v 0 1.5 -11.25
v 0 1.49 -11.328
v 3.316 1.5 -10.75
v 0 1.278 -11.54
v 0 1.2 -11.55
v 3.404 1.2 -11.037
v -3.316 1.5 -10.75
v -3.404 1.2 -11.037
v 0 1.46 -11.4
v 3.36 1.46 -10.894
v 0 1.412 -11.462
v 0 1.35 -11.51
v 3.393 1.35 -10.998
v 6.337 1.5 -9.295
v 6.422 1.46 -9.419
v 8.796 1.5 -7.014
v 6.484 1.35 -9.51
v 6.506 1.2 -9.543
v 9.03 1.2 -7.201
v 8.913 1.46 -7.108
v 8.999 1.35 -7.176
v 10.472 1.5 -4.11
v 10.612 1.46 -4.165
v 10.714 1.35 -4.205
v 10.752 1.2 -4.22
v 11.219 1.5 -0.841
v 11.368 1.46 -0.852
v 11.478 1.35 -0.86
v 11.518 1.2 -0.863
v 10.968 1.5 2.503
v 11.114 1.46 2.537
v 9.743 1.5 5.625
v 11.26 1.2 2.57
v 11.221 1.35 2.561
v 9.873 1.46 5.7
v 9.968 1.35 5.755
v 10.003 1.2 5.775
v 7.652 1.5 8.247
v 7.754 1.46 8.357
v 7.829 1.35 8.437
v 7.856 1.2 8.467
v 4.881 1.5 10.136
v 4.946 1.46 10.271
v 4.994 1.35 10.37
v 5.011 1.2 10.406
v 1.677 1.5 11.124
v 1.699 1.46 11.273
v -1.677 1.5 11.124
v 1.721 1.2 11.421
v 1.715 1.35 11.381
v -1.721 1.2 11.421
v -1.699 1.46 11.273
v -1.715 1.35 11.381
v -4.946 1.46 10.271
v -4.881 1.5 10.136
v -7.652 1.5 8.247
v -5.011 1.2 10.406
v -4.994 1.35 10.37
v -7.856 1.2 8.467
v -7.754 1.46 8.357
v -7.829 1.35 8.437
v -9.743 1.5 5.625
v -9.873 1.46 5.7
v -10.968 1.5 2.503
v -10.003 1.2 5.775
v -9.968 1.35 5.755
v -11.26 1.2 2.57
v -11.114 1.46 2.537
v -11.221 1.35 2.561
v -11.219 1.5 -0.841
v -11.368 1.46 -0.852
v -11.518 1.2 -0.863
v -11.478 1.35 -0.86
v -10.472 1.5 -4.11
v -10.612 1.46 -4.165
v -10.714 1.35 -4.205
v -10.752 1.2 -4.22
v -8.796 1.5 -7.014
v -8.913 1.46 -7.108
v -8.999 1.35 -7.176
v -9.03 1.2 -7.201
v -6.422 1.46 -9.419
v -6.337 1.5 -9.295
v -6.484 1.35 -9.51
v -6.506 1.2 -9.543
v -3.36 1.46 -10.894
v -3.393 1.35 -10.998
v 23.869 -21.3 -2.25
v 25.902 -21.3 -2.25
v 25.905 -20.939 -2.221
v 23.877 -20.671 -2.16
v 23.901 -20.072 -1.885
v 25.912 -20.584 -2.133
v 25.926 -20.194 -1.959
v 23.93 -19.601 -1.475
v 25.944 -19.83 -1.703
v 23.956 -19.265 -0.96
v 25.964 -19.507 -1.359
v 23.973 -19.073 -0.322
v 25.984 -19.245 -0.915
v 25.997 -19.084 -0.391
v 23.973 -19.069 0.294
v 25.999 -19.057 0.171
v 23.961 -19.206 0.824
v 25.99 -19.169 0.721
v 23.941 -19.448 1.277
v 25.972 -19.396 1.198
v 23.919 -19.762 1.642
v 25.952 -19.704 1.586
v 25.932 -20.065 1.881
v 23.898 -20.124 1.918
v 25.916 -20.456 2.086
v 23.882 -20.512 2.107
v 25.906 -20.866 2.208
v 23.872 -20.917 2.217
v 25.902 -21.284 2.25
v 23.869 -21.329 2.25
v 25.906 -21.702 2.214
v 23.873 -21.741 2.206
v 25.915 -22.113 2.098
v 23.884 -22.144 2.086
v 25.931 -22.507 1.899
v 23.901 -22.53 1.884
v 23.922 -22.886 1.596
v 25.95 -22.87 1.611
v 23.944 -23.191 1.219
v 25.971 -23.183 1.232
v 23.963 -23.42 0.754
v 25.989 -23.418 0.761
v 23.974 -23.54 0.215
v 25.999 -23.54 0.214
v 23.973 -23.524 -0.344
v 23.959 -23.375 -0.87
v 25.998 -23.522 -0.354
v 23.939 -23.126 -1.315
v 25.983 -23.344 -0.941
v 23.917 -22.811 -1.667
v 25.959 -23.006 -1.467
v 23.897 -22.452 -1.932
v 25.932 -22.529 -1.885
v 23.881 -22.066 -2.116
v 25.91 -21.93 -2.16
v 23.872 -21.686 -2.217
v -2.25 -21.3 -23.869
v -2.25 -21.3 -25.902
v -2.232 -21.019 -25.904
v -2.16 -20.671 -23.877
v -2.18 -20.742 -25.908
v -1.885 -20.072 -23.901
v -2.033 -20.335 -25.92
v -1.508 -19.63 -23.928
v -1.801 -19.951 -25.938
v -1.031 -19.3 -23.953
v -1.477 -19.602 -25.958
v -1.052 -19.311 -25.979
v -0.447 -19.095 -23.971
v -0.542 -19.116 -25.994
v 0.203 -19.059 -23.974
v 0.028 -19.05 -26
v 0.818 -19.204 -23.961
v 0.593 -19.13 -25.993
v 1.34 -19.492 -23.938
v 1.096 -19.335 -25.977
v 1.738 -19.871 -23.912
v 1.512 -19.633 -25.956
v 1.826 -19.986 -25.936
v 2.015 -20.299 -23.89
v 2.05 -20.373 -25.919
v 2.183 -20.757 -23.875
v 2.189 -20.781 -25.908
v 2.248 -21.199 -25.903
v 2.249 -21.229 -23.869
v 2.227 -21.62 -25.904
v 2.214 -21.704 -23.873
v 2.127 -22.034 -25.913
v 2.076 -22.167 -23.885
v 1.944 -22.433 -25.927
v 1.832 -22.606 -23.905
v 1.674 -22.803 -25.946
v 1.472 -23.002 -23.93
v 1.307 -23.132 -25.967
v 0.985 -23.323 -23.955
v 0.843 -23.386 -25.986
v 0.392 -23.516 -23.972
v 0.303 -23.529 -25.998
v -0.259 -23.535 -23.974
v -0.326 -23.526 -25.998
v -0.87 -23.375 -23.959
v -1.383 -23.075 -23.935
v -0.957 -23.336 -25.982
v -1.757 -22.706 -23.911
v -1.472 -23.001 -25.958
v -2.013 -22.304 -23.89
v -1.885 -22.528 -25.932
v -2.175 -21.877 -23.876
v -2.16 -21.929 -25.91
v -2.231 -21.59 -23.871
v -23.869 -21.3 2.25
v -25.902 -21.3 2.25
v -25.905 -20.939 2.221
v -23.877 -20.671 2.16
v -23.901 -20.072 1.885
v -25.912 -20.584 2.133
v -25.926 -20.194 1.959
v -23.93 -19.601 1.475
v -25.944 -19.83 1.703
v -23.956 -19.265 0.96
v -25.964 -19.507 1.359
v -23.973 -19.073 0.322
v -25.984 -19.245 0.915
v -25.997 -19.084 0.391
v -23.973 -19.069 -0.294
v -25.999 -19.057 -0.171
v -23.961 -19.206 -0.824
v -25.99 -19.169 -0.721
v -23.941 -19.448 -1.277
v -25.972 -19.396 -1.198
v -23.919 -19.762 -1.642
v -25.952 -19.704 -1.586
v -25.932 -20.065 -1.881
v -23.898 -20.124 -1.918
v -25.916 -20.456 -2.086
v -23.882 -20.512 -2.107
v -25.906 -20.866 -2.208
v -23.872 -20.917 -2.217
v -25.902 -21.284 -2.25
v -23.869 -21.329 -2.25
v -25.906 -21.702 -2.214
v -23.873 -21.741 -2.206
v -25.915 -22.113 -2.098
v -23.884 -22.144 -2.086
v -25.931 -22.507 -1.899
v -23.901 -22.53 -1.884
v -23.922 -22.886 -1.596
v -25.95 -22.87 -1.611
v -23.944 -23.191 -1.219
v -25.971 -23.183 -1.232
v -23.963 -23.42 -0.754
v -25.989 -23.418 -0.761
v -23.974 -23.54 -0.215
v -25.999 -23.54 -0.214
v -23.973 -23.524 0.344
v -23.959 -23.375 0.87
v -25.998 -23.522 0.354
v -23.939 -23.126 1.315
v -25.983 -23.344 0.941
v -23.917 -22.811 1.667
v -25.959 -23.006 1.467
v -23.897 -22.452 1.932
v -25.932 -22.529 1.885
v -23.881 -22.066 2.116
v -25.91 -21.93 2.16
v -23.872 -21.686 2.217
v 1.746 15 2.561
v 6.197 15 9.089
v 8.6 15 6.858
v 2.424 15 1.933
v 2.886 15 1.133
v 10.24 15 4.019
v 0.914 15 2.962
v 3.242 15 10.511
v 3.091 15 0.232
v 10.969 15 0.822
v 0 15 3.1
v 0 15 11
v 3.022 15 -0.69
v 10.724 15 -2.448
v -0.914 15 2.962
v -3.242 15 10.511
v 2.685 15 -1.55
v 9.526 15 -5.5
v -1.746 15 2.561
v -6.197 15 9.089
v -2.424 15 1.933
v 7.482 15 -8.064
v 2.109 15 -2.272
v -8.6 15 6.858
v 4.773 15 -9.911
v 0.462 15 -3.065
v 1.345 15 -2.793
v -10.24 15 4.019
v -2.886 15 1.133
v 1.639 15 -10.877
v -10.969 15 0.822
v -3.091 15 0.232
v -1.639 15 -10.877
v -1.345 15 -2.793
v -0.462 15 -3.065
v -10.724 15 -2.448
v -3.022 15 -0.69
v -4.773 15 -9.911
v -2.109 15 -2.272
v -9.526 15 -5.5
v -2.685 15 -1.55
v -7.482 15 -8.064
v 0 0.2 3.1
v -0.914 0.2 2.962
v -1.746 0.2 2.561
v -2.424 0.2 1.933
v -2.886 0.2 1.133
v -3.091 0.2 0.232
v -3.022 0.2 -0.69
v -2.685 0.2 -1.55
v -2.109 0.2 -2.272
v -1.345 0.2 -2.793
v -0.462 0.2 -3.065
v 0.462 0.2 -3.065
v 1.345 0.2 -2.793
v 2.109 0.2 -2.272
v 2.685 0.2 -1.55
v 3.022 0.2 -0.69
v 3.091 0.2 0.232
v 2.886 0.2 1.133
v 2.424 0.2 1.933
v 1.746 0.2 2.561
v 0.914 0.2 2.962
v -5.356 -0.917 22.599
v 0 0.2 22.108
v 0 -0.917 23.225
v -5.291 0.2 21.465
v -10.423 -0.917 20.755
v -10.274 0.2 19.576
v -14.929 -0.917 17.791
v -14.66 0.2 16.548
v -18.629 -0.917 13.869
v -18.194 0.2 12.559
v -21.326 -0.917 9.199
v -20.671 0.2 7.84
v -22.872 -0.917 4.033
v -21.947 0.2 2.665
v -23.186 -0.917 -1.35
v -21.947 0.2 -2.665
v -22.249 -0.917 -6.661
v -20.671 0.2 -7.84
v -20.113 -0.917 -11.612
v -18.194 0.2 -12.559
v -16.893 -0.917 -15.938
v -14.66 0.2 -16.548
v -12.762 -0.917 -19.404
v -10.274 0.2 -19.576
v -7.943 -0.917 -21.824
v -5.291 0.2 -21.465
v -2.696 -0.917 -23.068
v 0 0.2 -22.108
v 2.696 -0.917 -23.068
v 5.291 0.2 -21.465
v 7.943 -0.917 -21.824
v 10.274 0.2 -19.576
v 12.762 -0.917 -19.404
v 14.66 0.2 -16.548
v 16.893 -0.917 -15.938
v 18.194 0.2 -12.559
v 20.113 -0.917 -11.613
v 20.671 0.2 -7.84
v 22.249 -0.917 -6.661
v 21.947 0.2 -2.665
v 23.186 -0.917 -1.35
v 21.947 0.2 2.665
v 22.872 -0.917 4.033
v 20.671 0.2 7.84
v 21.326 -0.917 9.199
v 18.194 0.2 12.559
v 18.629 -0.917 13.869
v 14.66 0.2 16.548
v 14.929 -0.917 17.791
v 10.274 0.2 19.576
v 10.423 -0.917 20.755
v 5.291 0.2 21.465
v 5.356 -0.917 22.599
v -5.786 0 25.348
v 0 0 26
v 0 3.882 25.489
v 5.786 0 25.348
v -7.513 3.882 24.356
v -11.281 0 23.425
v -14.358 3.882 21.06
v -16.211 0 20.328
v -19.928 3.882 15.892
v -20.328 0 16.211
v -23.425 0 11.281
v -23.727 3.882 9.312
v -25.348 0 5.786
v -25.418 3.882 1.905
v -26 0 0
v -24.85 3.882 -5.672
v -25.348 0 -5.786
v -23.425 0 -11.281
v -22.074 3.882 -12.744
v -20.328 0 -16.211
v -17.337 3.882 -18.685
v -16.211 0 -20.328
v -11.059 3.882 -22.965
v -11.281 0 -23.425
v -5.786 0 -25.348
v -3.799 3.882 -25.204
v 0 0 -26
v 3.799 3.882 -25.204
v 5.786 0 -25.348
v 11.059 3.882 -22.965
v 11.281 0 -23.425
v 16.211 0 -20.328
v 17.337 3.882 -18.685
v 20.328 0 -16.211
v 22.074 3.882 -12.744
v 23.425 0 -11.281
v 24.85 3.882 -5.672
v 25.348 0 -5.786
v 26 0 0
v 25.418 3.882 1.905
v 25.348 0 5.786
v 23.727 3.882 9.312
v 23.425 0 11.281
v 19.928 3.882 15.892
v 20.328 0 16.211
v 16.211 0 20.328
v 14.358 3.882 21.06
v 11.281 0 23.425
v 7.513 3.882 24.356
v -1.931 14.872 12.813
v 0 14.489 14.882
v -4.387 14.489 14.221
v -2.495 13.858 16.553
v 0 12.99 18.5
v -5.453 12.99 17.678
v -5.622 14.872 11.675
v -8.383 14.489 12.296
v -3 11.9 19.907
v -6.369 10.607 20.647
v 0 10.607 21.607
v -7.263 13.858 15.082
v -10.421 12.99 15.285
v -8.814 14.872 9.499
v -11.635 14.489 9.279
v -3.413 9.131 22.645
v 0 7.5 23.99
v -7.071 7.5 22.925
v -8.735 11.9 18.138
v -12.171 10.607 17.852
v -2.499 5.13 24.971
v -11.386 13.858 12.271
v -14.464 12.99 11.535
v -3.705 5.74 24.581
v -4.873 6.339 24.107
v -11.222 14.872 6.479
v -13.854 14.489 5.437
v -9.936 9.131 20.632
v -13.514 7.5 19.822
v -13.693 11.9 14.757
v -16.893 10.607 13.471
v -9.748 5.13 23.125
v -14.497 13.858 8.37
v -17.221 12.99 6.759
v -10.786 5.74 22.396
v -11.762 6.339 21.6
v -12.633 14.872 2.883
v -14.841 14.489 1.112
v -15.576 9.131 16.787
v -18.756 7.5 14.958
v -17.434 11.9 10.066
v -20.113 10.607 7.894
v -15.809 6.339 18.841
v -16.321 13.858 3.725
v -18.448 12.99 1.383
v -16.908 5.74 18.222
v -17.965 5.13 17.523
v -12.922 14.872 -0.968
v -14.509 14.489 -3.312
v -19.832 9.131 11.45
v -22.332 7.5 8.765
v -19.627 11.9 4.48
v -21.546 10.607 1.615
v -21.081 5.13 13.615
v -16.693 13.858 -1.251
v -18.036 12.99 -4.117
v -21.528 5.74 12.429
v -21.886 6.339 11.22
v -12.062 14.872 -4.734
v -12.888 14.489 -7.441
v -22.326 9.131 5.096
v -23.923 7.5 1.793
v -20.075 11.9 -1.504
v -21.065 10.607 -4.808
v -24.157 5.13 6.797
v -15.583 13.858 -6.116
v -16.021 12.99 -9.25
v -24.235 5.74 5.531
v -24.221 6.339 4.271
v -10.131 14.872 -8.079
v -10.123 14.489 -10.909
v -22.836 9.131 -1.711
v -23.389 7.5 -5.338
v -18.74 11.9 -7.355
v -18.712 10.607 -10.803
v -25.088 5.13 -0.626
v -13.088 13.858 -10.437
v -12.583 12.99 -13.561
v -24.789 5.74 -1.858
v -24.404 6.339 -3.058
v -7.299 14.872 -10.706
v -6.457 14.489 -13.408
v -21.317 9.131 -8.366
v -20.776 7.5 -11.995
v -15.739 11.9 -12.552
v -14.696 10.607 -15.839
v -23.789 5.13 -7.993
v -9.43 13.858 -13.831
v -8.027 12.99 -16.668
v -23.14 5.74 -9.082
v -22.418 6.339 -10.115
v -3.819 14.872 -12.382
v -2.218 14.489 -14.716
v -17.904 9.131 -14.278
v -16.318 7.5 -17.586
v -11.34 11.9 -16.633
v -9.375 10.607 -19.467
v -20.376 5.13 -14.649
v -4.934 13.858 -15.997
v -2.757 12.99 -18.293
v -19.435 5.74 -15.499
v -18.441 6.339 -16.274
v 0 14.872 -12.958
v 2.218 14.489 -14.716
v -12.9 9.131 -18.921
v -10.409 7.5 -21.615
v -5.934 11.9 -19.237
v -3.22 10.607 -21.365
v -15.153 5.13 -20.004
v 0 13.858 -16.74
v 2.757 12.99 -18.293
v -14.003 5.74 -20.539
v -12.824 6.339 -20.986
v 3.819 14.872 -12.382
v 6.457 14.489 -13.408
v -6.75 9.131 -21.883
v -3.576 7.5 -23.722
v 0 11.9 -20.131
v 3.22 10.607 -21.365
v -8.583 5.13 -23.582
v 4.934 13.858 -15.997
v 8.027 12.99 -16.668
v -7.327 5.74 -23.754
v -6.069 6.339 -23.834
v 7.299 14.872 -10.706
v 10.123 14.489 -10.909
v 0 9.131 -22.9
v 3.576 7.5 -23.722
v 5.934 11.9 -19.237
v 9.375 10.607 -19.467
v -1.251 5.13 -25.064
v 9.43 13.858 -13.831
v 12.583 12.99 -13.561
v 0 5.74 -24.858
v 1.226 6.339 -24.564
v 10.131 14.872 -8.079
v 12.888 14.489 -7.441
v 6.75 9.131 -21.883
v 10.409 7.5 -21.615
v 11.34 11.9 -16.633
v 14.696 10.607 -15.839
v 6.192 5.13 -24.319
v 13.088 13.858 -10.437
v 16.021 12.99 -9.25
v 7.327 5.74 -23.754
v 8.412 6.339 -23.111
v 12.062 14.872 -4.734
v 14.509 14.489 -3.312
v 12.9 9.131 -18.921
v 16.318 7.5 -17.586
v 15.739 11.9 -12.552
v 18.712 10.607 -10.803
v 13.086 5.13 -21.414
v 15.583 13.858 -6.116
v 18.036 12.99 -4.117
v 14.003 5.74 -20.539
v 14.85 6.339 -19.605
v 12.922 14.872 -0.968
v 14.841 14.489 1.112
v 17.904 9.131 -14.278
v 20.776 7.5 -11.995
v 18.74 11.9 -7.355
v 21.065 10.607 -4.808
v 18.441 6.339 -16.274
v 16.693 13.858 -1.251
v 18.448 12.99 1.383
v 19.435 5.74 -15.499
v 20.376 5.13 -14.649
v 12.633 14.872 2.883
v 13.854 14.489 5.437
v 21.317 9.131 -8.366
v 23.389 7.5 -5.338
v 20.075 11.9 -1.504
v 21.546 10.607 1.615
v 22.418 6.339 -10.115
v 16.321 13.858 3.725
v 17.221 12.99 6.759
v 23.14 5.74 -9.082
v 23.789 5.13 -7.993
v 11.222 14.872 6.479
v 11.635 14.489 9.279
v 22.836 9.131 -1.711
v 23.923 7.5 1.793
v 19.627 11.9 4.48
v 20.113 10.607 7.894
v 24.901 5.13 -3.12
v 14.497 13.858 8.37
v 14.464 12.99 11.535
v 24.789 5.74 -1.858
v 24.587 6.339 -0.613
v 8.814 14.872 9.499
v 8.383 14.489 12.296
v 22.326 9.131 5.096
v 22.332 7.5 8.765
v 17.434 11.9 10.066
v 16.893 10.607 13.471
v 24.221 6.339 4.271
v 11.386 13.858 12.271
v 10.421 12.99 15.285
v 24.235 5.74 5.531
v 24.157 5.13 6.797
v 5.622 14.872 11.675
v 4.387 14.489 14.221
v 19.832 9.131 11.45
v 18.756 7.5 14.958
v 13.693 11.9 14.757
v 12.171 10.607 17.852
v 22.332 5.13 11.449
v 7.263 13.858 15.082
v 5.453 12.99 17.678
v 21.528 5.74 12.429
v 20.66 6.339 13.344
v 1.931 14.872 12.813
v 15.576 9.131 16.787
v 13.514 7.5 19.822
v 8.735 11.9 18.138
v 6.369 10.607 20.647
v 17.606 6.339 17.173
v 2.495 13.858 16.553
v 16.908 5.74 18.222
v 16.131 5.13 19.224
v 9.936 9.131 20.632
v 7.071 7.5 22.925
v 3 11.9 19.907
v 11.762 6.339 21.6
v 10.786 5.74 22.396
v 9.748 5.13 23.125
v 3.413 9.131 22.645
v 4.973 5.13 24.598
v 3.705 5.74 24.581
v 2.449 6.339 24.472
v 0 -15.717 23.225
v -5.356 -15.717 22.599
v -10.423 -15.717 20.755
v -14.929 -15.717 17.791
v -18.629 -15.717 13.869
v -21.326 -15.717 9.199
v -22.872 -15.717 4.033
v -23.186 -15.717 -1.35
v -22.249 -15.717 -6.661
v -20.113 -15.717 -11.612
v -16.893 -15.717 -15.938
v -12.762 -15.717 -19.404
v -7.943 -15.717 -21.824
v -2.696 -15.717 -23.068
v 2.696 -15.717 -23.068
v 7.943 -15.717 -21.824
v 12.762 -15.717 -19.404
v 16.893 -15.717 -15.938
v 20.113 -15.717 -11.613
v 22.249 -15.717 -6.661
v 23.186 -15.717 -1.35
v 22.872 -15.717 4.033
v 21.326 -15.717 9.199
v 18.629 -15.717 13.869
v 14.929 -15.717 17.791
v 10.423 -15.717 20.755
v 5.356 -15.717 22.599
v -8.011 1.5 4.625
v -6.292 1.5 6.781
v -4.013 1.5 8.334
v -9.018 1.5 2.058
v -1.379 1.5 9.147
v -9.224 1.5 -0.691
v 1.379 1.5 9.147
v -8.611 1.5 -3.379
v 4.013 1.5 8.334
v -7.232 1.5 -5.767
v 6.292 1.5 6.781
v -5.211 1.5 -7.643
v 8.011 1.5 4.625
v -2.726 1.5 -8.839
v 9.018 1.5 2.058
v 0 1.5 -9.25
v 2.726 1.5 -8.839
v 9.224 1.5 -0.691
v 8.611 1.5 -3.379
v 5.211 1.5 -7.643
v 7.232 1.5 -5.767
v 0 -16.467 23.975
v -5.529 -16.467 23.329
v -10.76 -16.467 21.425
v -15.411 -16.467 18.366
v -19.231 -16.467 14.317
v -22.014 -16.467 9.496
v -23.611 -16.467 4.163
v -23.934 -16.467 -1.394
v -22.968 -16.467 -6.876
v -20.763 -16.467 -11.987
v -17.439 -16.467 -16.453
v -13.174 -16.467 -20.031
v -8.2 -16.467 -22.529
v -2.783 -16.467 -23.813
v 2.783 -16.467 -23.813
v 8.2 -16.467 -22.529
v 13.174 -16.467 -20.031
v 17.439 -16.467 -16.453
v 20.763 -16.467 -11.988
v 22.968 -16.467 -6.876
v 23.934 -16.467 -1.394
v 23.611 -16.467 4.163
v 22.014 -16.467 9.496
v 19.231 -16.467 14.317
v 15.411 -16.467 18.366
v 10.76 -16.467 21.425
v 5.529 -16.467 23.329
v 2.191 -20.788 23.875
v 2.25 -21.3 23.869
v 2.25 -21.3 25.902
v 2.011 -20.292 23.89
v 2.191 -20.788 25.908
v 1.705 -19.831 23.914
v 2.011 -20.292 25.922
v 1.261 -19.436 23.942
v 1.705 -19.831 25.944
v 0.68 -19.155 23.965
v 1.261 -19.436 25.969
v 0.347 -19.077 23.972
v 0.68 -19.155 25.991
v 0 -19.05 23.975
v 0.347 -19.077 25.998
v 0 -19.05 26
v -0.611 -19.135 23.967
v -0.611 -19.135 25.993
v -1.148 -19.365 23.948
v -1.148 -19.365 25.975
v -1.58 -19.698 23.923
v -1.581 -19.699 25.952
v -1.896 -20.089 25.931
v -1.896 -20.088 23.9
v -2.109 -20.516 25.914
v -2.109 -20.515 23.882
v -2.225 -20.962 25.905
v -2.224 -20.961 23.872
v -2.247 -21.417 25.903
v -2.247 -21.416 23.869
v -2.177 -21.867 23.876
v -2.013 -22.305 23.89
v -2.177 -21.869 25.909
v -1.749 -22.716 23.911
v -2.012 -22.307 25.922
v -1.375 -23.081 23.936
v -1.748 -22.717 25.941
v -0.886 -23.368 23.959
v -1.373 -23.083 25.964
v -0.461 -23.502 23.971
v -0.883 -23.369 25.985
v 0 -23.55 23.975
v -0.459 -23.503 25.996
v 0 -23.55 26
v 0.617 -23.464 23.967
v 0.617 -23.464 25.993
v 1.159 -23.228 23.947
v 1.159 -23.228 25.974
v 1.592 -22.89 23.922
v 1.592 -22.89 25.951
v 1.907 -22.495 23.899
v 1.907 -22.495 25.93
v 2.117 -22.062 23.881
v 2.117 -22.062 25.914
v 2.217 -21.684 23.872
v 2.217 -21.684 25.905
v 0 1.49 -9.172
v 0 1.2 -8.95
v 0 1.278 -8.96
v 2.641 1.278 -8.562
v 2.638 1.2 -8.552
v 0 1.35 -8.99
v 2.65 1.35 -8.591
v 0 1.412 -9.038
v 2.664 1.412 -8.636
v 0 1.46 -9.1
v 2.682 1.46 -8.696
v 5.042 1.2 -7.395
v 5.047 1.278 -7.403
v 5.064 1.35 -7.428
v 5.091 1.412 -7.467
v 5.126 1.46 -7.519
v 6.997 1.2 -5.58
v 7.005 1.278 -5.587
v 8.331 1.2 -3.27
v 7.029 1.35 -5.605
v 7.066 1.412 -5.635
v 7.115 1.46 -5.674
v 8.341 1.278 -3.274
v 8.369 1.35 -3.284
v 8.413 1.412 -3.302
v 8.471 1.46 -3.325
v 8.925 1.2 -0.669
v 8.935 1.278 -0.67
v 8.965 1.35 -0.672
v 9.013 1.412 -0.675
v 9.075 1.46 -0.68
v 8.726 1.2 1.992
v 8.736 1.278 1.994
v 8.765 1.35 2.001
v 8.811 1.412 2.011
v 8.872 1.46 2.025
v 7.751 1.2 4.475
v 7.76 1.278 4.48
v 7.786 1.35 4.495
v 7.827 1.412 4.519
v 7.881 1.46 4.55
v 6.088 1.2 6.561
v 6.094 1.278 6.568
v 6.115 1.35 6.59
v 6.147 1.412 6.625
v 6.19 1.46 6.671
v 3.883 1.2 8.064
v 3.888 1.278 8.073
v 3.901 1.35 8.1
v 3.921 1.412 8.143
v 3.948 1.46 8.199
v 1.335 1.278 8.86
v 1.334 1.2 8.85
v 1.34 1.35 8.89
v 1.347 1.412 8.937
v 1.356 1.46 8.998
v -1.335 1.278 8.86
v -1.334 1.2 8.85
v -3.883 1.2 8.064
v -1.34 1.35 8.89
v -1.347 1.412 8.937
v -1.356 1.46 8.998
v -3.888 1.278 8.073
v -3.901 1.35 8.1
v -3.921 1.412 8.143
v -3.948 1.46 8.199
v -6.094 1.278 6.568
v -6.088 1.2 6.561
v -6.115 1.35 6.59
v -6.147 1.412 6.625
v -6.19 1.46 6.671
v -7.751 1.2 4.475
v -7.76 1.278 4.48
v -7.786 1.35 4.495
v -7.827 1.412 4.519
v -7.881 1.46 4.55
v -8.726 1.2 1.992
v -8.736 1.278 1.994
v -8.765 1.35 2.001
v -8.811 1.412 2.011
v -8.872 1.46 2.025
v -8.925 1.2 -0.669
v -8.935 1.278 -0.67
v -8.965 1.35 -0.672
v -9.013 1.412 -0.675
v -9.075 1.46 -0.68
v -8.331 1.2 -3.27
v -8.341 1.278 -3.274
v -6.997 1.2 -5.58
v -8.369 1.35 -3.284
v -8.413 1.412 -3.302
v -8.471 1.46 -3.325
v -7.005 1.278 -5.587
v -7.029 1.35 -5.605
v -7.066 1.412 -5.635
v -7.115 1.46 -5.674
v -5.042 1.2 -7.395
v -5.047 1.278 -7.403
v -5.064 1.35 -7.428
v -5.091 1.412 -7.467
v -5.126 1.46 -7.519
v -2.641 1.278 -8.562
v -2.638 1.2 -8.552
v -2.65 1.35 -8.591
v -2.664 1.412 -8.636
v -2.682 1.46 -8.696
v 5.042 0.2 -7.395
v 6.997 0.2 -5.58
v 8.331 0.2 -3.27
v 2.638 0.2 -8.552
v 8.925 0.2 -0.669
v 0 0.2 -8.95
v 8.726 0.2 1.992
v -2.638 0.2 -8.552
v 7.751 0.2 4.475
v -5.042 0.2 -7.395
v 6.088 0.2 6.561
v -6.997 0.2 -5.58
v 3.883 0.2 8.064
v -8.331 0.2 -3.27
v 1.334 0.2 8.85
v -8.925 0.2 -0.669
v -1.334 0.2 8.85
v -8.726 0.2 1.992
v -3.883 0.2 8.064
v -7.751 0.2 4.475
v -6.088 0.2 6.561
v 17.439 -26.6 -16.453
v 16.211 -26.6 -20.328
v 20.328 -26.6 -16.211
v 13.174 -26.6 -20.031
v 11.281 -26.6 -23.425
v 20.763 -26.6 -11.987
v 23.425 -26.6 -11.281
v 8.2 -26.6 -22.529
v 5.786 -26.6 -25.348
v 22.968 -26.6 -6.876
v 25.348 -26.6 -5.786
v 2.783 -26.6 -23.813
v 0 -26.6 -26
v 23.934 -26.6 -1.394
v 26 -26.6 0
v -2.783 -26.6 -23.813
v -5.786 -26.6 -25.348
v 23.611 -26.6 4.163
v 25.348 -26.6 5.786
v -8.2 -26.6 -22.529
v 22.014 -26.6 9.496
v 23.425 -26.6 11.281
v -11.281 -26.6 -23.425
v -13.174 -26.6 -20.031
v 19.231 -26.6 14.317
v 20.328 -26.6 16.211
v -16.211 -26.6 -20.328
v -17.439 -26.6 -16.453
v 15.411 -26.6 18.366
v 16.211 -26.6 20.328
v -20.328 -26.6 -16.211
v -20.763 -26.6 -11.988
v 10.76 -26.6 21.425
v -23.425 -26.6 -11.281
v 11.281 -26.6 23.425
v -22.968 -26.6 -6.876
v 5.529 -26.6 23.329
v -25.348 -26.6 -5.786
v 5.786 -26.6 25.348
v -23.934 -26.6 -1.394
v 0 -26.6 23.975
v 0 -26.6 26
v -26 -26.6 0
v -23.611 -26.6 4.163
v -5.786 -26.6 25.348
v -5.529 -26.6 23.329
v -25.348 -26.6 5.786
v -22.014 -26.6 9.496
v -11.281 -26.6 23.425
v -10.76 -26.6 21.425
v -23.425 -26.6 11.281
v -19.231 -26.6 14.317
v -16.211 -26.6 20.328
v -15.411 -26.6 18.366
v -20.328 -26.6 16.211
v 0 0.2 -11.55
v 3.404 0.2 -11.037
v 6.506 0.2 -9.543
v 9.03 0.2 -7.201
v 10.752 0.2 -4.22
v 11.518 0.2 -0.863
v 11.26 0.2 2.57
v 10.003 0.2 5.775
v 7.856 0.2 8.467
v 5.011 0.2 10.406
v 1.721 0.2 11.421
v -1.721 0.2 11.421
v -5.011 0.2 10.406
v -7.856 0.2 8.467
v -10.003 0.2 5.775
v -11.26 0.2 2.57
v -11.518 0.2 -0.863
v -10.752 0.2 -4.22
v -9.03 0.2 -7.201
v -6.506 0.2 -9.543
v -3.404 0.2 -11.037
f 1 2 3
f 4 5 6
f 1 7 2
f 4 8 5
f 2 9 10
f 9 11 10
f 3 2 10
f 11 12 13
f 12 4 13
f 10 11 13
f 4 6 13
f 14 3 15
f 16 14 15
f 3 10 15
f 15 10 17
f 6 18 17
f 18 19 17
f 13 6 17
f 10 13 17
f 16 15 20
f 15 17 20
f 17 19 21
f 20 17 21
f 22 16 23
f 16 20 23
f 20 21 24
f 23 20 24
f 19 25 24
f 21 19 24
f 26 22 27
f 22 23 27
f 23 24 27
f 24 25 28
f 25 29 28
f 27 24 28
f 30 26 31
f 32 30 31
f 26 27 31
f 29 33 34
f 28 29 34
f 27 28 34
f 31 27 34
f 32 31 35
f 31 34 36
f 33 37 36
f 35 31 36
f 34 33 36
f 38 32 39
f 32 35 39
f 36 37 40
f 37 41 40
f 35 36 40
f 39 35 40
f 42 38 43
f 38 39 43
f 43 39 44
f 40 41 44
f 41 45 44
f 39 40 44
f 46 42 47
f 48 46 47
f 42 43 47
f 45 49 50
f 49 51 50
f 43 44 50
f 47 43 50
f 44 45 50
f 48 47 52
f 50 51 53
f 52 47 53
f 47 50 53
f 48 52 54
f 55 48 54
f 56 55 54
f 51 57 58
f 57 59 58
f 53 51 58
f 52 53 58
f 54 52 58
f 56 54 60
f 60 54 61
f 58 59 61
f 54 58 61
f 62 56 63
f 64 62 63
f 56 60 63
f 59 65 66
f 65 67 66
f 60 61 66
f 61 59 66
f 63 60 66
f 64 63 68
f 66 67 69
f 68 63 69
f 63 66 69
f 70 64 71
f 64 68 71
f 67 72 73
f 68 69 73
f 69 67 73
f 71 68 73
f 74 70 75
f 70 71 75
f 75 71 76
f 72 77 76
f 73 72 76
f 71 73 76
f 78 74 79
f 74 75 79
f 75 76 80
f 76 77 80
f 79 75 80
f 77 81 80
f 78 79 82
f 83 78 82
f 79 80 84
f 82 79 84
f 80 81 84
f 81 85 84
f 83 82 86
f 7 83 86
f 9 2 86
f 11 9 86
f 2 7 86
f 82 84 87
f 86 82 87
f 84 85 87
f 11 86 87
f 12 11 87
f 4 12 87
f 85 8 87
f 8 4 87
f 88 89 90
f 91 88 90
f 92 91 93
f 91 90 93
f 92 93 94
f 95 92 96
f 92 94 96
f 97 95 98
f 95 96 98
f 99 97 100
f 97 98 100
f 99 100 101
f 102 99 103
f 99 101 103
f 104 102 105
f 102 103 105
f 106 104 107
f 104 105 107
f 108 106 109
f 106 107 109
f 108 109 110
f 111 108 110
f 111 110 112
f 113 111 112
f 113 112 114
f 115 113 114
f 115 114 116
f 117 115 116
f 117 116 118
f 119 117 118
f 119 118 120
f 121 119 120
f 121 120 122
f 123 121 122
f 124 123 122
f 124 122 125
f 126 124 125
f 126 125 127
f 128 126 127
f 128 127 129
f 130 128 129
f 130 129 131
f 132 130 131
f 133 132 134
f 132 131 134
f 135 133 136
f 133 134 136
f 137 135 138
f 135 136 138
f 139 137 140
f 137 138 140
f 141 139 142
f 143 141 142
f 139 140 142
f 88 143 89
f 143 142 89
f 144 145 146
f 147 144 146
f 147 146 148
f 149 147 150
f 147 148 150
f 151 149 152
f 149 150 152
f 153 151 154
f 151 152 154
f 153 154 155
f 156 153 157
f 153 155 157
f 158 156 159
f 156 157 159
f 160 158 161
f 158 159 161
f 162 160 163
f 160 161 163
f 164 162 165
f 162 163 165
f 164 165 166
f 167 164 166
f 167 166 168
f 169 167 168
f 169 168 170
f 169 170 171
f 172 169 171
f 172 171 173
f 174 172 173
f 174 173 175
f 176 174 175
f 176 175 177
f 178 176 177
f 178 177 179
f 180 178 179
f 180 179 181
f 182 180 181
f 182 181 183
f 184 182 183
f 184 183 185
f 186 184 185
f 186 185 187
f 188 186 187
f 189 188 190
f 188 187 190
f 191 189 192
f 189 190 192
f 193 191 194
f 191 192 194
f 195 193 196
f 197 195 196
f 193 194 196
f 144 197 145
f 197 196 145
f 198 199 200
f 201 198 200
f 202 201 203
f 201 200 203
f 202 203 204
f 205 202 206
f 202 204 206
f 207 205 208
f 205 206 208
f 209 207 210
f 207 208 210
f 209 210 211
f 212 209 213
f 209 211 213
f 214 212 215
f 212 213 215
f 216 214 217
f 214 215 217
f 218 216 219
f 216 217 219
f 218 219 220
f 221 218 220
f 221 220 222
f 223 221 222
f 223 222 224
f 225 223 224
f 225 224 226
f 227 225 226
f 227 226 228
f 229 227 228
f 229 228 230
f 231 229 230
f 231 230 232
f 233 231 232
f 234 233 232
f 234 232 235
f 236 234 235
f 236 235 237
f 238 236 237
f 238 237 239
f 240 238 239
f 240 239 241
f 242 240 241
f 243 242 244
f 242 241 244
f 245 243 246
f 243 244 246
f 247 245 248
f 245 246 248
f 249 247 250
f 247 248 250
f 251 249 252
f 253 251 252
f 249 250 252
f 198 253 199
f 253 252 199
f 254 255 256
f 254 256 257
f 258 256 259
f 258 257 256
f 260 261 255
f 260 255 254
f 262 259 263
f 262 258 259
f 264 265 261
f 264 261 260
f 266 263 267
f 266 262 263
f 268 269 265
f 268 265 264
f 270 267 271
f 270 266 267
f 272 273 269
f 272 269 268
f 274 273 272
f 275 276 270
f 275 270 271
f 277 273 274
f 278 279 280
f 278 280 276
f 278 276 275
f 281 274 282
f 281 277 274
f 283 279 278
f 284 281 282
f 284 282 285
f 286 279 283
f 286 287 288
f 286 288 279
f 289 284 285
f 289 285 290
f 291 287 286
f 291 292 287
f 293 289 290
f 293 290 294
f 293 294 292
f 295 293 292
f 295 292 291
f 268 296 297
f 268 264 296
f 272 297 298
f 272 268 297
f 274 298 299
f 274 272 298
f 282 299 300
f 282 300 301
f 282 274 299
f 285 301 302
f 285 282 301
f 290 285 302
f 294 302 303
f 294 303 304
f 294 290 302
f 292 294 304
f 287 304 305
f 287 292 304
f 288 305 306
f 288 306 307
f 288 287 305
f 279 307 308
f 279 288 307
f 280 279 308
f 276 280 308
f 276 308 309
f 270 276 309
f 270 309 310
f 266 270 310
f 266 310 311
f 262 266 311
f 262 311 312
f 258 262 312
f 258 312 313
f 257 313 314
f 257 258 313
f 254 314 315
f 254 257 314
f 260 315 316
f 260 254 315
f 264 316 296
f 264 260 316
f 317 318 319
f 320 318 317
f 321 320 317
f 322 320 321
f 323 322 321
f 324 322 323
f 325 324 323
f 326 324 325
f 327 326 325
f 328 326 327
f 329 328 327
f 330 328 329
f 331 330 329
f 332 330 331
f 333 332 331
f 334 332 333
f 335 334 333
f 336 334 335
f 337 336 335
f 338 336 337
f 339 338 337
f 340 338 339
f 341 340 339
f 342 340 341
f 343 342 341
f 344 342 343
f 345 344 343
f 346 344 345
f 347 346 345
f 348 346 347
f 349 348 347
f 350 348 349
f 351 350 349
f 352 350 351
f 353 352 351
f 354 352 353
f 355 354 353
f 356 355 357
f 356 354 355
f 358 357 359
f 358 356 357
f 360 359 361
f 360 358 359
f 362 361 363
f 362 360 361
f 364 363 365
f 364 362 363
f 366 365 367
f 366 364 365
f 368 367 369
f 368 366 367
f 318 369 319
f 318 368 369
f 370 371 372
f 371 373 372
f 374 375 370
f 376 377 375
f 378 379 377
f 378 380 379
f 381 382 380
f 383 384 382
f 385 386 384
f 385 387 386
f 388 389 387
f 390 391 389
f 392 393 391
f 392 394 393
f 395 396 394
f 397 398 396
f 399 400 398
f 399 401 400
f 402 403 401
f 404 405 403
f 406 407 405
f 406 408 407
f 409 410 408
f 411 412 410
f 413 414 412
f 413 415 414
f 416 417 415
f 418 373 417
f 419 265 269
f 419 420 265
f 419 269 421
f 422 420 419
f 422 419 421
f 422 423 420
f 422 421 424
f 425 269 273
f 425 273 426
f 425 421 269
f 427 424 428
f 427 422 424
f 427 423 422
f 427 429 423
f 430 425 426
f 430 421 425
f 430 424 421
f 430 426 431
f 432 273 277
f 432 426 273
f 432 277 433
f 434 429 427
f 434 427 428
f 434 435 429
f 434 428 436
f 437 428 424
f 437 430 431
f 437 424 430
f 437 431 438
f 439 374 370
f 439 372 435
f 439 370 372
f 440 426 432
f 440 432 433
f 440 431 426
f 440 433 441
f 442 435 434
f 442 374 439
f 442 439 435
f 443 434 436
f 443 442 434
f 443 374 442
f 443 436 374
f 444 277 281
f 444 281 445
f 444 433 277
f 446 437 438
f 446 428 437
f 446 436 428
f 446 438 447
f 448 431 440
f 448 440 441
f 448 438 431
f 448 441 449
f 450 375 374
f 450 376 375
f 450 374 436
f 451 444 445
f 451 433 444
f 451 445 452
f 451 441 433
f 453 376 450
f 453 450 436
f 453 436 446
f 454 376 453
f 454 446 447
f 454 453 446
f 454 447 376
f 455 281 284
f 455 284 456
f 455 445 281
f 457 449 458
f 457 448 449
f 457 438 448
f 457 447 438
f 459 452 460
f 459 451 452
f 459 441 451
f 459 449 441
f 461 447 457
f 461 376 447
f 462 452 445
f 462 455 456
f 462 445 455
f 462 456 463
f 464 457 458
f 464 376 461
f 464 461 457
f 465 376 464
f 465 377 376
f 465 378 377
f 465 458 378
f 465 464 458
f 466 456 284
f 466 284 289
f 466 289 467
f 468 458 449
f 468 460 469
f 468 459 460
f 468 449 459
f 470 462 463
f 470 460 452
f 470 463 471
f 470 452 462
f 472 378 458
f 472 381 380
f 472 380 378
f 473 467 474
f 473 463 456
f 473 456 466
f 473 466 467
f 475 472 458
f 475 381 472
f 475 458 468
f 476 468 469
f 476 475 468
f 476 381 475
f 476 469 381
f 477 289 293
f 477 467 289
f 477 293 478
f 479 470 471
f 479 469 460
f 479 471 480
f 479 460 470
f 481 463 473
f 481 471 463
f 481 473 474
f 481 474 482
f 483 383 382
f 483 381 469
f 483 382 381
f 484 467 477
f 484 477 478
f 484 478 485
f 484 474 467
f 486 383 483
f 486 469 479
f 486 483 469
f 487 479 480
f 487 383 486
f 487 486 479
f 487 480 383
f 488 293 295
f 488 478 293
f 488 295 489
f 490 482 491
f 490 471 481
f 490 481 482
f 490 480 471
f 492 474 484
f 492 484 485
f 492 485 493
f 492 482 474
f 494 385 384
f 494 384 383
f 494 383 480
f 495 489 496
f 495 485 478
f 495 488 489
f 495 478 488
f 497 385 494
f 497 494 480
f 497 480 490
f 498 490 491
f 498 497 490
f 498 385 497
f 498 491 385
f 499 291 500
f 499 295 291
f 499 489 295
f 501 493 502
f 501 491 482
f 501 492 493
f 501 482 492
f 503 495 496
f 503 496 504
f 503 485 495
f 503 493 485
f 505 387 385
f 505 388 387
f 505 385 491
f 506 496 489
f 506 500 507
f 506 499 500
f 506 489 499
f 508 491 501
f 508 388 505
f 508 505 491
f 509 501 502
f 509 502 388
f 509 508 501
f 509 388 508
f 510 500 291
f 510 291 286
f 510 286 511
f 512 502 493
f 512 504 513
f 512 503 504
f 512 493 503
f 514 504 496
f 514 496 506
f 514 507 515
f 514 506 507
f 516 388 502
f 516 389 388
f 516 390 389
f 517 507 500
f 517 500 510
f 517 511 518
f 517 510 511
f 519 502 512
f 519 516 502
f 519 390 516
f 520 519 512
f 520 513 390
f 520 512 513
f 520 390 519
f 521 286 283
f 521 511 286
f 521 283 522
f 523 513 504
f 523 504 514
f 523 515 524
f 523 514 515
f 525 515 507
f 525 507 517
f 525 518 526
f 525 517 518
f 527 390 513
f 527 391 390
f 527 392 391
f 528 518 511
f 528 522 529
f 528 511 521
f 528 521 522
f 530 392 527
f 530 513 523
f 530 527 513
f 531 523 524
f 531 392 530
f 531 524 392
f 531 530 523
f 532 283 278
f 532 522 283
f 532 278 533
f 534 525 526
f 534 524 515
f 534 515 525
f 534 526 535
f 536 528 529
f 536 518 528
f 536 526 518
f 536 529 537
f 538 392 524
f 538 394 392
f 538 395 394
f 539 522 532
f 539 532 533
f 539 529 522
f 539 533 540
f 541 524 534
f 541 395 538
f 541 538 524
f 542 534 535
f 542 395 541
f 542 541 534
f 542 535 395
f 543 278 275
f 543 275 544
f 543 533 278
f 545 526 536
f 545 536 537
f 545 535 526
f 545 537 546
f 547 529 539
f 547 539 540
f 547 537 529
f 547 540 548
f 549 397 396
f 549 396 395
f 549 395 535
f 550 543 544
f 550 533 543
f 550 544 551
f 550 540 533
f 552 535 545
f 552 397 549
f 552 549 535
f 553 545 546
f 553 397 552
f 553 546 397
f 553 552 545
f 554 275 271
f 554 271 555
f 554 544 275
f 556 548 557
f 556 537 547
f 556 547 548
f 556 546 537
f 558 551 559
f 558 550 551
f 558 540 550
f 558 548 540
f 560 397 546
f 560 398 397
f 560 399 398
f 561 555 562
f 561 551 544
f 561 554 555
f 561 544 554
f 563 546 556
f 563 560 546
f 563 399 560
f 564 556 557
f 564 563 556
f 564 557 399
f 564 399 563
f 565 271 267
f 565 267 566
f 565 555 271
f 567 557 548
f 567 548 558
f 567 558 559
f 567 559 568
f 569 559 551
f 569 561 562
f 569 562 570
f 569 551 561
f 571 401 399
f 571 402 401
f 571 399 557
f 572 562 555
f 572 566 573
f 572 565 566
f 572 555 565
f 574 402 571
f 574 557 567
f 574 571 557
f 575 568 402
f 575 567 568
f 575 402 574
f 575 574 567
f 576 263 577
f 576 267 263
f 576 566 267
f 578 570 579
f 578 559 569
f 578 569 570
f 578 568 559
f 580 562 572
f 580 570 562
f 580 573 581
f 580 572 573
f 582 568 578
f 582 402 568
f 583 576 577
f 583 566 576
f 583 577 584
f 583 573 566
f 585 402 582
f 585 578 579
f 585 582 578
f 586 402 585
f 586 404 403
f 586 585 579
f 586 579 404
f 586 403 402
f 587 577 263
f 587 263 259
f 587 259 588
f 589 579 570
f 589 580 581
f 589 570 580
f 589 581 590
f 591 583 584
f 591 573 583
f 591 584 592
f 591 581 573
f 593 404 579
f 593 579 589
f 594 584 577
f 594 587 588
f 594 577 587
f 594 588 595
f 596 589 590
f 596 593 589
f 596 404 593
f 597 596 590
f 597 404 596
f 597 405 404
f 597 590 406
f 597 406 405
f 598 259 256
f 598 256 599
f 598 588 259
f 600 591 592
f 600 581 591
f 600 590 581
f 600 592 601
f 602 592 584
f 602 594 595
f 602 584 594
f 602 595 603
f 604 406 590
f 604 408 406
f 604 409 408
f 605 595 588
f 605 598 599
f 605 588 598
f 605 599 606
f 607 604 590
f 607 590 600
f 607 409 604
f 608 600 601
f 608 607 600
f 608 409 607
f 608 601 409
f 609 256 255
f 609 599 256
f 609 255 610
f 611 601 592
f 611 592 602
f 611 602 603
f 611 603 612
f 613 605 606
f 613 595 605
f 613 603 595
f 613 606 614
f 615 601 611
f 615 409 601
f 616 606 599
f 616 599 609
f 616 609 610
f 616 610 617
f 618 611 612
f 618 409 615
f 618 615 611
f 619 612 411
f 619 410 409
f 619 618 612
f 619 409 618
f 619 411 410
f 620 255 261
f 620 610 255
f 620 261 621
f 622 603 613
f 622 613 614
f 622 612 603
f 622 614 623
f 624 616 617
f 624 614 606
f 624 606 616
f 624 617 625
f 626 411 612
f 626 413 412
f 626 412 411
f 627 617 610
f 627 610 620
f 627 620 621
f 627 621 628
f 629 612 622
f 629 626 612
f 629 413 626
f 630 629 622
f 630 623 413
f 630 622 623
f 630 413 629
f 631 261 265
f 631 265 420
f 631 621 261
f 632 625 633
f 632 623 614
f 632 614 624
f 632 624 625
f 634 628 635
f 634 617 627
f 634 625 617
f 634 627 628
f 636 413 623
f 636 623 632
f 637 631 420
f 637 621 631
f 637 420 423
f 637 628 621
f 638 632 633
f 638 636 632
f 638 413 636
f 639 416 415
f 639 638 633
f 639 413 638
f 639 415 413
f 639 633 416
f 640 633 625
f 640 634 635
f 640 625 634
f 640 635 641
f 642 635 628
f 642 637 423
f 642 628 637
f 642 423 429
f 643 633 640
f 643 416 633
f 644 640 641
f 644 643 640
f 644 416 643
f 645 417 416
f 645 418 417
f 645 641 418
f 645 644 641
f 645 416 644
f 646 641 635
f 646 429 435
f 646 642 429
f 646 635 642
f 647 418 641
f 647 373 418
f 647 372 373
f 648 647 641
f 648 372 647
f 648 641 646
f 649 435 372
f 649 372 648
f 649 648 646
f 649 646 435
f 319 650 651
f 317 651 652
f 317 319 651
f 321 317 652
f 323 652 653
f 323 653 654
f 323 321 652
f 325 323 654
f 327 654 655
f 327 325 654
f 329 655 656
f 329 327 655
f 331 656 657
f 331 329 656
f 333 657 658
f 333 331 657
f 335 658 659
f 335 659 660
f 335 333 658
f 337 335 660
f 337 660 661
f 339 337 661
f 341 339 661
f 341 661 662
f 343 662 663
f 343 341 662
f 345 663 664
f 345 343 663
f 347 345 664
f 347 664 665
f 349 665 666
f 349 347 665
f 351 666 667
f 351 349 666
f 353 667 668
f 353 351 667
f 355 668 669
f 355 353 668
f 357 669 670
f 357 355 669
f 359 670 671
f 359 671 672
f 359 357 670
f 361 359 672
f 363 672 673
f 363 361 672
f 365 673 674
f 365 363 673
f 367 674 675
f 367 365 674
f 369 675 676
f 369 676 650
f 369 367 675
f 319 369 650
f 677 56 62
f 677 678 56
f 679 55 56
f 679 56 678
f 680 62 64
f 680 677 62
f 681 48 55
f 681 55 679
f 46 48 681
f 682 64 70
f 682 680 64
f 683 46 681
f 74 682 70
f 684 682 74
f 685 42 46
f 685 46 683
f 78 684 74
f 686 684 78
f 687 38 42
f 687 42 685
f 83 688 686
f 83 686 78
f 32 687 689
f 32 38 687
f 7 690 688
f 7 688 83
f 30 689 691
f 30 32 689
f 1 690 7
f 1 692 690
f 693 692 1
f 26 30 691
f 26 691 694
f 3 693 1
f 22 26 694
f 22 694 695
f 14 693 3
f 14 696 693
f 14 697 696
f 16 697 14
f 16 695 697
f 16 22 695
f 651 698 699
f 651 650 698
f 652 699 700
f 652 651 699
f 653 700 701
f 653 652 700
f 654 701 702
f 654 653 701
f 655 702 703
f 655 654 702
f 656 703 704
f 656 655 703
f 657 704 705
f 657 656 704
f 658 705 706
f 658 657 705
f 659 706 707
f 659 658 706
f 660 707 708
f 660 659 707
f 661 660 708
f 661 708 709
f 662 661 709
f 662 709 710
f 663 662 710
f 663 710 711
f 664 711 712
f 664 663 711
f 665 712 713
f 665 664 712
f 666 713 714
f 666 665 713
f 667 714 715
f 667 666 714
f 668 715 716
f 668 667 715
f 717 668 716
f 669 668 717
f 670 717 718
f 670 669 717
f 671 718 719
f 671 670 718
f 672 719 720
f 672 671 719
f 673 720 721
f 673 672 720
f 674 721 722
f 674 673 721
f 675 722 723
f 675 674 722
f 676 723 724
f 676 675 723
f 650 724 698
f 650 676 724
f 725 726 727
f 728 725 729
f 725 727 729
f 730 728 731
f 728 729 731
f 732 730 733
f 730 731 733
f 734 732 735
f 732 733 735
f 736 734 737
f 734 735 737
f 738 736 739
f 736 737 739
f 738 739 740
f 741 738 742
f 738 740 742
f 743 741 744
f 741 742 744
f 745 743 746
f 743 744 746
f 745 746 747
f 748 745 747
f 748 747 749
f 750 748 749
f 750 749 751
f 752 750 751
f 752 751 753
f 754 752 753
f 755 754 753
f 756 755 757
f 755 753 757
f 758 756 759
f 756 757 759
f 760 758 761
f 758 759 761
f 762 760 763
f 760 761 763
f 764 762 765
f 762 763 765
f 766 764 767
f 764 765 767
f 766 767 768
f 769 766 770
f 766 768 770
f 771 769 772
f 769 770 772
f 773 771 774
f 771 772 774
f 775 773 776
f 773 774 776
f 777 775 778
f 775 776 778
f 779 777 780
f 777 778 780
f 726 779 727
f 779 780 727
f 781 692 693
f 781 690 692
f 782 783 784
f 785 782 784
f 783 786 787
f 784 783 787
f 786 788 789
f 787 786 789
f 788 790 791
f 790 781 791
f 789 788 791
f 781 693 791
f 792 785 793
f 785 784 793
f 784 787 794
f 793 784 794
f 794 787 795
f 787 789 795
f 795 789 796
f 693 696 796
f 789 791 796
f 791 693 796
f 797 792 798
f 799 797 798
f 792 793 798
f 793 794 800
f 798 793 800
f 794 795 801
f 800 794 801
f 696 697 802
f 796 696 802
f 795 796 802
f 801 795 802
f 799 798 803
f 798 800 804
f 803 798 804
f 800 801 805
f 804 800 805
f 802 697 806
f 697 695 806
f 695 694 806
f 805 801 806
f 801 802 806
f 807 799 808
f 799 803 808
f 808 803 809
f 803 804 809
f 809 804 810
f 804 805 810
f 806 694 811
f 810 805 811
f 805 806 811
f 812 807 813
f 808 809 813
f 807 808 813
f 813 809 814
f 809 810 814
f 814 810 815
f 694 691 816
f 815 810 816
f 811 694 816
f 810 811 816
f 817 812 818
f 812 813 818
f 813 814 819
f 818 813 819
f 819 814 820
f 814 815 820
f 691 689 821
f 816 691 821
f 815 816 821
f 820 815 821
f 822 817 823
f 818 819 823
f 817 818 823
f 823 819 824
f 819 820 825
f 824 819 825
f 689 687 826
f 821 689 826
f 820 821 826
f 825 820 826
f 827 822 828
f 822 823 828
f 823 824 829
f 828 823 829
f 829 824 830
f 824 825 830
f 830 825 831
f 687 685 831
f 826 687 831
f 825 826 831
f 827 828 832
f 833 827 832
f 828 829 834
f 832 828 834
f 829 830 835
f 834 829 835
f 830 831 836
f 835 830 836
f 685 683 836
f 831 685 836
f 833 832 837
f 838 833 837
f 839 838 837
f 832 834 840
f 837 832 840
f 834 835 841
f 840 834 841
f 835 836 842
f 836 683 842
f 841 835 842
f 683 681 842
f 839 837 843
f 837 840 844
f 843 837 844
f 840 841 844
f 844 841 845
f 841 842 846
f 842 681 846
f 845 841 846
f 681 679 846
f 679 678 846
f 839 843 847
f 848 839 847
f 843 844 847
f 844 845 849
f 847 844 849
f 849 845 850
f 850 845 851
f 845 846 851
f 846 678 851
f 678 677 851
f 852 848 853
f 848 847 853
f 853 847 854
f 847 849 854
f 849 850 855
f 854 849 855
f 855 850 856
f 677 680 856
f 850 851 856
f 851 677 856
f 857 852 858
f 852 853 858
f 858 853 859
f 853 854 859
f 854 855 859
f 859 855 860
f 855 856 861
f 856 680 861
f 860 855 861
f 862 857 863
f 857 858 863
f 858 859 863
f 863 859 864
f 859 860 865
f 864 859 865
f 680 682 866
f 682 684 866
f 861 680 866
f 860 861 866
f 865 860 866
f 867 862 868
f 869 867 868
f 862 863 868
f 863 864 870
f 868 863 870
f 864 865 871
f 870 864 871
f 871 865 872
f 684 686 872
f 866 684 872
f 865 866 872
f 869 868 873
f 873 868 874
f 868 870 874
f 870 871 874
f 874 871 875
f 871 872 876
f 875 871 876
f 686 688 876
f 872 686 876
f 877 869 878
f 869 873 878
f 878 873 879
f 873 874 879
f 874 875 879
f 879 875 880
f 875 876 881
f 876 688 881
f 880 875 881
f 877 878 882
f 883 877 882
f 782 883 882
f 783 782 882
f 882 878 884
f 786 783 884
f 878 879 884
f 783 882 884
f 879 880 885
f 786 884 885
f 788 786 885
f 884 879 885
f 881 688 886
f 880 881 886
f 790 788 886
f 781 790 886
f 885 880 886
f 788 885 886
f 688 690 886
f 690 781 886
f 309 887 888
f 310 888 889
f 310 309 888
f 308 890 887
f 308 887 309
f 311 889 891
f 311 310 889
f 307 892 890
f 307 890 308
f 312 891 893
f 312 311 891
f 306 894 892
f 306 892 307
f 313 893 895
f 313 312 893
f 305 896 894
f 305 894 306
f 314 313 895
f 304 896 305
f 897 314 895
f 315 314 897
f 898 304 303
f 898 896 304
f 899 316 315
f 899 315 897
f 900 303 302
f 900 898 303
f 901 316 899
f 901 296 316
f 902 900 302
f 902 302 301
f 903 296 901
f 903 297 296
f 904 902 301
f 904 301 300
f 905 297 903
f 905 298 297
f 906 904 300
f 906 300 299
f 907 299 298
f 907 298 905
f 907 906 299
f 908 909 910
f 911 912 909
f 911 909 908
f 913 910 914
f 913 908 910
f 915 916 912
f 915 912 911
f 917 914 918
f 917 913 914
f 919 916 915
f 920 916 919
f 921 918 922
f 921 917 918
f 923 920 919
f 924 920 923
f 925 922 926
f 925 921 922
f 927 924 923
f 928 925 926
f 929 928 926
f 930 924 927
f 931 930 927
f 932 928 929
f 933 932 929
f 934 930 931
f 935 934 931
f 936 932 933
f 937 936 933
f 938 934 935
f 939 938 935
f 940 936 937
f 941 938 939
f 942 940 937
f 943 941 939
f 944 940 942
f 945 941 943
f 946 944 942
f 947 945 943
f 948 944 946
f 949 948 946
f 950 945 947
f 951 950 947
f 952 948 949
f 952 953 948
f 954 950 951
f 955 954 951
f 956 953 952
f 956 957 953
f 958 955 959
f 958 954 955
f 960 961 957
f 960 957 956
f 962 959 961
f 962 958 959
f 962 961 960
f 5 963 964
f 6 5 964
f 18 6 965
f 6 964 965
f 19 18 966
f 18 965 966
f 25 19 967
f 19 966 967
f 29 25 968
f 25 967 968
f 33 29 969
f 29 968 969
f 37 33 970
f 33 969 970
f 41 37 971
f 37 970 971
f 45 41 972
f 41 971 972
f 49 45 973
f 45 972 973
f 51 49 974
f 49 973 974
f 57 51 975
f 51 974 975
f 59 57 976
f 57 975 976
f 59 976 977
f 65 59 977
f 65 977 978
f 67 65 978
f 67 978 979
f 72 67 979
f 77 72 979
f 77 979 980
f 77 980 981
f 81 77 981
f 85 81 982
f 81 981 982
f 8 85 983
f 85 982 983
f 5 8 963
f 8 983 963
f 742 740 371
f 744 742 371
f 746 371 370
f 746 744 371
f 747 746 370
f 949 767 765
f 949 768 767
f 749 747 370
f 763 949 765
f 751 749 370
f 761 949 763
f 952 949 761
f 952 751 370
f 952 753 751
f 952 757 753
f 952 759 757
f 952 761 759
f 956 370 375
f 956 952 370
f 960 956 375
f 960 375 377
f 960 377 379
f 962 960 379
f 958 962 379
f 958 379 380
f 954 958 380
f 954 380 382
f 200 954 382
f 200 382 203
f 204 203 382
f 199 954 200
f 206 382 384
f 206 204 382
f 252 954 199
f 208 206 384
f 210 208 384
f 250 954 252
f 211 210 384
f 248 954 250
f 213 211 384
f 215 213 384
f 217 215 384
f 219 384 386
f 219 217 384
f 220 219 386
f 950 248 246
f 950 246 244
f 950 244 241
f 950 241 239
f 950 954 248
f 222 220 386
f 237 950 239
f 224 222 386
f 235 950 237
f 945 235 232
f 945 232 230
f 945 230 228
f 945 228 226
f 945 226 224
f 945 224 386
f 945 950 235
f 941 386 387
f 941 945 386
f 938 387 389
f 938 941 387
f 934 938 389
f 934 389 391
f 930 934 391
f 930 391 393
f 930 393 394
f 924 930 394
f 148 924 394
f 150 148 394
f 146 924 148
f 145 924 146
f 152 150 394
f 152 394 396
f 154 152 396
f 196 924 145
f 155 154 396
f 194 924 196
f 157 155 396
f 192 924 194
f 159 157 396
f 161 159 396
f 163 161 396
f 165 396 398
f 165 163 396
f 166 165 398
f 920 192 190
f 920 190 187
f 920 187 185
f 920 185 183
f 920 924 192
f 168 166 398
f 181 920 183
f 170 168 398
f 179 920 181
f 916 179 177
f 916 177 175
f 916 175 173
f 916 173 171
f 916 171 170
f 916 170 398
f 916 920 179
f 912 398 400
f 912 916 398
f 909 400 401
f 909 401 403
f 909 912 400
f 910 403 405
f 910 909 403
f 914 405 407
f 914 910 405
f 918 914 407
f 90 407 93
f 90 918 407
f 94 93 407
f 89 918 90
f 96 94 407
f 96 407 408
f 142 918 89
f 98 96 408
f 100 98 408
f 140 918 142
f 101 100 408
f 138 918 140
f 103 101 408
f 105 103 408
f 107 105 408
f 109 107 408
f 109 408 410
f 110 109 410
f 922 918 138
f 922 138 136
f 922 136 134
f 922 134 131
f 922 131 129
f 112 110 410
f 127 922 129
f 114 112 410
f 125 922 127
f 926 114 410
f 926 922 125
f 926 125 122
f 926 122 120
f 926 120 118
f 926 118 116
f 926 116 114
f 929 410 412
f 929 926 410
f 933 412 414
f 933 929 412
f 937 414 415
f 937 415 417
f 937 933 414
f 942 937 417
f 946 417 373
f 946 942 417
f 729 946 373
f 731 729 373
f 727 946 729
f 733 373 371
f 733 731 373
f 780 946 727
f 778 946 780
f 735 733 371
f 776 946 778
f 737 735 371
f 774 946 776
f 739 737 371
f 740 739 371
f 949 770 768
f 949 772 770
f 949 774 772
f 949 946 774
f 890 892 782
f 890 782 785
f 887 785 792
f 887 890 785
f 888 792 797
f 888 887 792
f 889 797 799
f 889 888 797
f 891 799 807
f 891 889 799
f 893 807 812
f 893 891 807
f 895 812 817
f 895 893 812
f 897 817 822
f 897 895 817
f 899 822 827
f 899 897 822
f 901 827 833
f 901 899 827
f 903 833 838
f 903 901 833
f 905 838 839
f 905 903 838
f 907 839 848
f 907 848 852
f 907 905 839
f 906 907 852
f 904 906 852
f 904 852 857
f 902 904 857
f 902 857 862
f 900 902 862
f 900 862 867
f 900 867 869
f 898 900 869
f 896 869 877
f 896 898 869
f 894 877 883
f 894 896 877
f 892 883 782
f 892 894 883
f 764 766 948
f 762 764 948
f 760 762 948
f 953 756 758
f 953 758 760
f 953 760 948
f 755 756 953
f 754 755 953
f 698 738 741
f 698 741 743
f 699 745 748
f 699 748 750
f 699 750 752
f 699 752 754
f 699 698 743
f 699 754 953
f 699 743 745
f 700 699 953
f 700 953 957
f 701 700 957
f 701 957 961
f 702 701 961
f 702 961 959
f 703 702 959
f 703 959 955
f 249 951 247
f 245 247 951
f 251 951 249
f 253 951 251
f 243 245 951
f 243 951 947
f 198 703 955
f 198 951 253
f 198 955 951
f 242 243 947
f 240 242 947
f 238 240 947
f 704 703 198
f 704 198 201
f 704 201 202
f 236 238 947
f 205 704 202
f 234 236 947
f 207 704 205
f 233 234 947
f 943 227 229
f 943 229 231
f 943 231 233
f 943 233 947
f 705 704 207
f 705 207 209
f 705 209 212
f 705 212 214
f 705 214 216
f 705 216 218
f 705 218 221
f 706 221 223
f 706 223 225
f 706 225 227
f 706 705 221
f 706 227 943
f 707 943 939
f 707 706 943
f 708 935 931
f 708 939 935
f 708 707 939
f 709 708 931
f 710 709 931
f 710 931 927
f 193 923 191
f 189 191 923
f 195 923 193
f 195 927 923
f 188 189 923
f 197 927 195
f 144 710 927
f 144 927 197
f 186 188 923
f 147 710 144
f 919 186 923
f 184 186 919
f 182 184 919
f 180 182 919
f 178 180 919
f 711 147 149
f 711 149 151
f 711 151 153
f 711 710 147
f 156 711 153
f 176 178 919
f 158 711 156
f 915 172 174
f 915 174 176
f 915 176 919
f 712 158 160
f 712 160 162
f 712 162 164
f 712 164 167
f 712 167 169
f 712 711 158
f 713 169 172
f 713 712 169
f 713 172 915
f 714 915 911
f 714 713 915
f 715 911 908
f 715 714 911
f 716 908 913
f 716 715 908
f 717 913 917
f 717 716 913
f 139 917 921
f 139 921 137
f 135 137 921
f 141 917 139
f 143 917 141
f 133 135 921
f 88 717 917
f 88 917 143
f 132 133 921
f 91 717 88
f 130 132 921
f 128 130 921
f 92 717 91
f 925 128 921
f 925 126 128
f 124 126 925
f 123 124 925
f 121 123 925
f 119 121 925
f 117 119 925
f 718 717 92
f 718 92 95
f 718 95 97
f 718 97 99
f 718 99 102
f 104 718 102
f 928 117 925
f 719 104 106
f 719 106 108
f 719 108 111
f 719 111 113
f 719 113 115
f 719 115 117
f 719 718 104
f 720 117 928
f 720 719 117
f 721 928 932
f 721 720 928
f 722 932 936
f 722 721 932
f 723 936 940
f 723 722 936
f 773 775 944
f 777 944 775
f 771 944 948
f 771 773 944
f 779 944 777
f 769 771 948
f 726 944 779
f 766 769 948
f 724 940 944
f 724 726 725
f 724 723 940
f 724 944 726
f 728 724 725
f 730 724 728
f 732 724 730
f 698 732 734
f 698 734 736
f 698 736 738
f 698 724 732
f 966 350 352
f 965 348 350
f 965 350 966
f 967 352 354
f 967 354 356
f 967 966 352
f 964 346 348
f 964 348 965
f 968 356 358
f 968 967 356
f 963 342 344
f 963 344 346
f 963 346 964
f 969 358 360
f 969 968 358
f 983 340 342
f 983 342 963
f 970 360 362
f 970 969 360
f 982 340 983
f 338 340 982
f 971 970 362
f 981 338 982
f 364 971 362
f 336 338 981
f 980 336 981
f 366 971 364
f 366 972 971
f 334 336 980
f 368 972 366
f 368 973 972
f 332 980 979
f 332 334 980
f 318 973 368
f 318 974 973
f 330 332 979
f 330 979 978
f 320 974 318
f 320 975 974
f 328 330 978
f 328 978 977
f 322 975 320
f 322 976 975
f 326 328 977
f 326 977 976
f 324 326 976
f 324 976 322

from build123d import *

# Parameters (mm, degrees)
SKETCH6_R          = 2.25
CUT_EXTRUDE1_DEPTH = 10
CIRPATTERN1_COUNT  = 4
SKETCH7_R          = 26
CUT_EXTRUDE2_DEPTH = 0.2
SKETCH8_R          = 11.55
SKETCH8_R_2        = 8.95
CUT_EXTRUDE3_DEPTH = 1.3
FILLET1_R          = 0.3


with BuildPart() as part:
    # Sketch1 → Revolve2 (revolve)
    with BuildSketch(Plane(origin=(0, 0, 0), x_dir=(0, 0, -1), z_dir=(1, 0, 0))):
        Polygon((-26, -26.8), (-23.975, -26.8), (-23.975, -16.467157288), (-23.225, -15.717157288), (-23.225, -0.917157288), (-22.107842712, 0.2), (-8.475, 0.2), (-3.1, 0.2), (-3.1, 15), (-26, 15), align=None)
    revolve(axis=Axis((0, 42.157107232, 0), (0, -1, 0)))

    # Sketch5 → Cut-Revolve1 (revolve, cut)
    with BuildSketch(Plane.XY, mode=Mode.PRIVATE) as cut_revolve1_sk:
        with BuildLine():
            Line((-26, 15), (-11, 15))
            ThreePointArc((-11, 15), (-21.606601718, 10.606601718), (-26, 0))
            Line((-26, 0), (-26, 15))
        make_face()
    revolve(cut_revolve1_sk.sketch.rotate(Axis((0, 20, 0), (0, -1, 0)), 270), axis=Axis((0, 20, 0), (0, -1, 0)), mode=Mode.SUBTRACT)

    # Sketch6 → Cut-Extrude1 (cut)
    with BuildSketch(Plane.ZY.offset(26)):
        with Locations((0, -21.3)):
            Circle(SKETCH6_R)
    cut_extrude1 = extrude(amount=-CUT_EXTRUDE1_DEPTH, mode=Mode.SUBTRACT)

    # CirPattern1: Cut-Extrude1 ×4 about axis
    cirpattern1_axis = Axis((0, -26.8, 0), (0, 1, 0))
    for i in range(1, CIRPATTERN1_COUNT):
        add(cut_extrude1.rotate(cirpattern1_axis, i * 360 / CIRPATTERN1_COUNT), mode=Mode.SUBTRACT)

    # Sketch7 → Cut-Extrude2 (cut)
    with BuildSketch(Plane.XZ.offset(26.8)):
        with Locations(Location((0, 0, 0), (0, 0, 90))):
            Circle(SKETCH7_R)
    extrude(amount=-CUT_EXTRUDE2_DEPTH, mode=Mode.SUBTRACT)

    # Sketch8 → Cut-Extrude3 (cut)
    with BuildSketch(Plane.XZ.offset(-0.2)):
        with Locations(Location((0, 0, 0), (0, 0, 270))):
            Circle(SKETCH8_R)
        with Locations(Location((0, 0, 0), (0, 0, 270))):
            Circle(SKETCH8_R_2, mode=Mode.SUBTRACT)
    extrude(amount=-CUT_EXTRUDE3_DEPTH, mode=Mode.SUBTRACT)

    # Fillet1
    fillet1_edges = [part.edges().sort_by_distance(p)[0] for p in [
        (0, 1.5, 11.55),
        (0, 1.5, 8.95),
    ]]
    fillet(fillet1_edges, radius=FILLET1_R)


solid = part.part
